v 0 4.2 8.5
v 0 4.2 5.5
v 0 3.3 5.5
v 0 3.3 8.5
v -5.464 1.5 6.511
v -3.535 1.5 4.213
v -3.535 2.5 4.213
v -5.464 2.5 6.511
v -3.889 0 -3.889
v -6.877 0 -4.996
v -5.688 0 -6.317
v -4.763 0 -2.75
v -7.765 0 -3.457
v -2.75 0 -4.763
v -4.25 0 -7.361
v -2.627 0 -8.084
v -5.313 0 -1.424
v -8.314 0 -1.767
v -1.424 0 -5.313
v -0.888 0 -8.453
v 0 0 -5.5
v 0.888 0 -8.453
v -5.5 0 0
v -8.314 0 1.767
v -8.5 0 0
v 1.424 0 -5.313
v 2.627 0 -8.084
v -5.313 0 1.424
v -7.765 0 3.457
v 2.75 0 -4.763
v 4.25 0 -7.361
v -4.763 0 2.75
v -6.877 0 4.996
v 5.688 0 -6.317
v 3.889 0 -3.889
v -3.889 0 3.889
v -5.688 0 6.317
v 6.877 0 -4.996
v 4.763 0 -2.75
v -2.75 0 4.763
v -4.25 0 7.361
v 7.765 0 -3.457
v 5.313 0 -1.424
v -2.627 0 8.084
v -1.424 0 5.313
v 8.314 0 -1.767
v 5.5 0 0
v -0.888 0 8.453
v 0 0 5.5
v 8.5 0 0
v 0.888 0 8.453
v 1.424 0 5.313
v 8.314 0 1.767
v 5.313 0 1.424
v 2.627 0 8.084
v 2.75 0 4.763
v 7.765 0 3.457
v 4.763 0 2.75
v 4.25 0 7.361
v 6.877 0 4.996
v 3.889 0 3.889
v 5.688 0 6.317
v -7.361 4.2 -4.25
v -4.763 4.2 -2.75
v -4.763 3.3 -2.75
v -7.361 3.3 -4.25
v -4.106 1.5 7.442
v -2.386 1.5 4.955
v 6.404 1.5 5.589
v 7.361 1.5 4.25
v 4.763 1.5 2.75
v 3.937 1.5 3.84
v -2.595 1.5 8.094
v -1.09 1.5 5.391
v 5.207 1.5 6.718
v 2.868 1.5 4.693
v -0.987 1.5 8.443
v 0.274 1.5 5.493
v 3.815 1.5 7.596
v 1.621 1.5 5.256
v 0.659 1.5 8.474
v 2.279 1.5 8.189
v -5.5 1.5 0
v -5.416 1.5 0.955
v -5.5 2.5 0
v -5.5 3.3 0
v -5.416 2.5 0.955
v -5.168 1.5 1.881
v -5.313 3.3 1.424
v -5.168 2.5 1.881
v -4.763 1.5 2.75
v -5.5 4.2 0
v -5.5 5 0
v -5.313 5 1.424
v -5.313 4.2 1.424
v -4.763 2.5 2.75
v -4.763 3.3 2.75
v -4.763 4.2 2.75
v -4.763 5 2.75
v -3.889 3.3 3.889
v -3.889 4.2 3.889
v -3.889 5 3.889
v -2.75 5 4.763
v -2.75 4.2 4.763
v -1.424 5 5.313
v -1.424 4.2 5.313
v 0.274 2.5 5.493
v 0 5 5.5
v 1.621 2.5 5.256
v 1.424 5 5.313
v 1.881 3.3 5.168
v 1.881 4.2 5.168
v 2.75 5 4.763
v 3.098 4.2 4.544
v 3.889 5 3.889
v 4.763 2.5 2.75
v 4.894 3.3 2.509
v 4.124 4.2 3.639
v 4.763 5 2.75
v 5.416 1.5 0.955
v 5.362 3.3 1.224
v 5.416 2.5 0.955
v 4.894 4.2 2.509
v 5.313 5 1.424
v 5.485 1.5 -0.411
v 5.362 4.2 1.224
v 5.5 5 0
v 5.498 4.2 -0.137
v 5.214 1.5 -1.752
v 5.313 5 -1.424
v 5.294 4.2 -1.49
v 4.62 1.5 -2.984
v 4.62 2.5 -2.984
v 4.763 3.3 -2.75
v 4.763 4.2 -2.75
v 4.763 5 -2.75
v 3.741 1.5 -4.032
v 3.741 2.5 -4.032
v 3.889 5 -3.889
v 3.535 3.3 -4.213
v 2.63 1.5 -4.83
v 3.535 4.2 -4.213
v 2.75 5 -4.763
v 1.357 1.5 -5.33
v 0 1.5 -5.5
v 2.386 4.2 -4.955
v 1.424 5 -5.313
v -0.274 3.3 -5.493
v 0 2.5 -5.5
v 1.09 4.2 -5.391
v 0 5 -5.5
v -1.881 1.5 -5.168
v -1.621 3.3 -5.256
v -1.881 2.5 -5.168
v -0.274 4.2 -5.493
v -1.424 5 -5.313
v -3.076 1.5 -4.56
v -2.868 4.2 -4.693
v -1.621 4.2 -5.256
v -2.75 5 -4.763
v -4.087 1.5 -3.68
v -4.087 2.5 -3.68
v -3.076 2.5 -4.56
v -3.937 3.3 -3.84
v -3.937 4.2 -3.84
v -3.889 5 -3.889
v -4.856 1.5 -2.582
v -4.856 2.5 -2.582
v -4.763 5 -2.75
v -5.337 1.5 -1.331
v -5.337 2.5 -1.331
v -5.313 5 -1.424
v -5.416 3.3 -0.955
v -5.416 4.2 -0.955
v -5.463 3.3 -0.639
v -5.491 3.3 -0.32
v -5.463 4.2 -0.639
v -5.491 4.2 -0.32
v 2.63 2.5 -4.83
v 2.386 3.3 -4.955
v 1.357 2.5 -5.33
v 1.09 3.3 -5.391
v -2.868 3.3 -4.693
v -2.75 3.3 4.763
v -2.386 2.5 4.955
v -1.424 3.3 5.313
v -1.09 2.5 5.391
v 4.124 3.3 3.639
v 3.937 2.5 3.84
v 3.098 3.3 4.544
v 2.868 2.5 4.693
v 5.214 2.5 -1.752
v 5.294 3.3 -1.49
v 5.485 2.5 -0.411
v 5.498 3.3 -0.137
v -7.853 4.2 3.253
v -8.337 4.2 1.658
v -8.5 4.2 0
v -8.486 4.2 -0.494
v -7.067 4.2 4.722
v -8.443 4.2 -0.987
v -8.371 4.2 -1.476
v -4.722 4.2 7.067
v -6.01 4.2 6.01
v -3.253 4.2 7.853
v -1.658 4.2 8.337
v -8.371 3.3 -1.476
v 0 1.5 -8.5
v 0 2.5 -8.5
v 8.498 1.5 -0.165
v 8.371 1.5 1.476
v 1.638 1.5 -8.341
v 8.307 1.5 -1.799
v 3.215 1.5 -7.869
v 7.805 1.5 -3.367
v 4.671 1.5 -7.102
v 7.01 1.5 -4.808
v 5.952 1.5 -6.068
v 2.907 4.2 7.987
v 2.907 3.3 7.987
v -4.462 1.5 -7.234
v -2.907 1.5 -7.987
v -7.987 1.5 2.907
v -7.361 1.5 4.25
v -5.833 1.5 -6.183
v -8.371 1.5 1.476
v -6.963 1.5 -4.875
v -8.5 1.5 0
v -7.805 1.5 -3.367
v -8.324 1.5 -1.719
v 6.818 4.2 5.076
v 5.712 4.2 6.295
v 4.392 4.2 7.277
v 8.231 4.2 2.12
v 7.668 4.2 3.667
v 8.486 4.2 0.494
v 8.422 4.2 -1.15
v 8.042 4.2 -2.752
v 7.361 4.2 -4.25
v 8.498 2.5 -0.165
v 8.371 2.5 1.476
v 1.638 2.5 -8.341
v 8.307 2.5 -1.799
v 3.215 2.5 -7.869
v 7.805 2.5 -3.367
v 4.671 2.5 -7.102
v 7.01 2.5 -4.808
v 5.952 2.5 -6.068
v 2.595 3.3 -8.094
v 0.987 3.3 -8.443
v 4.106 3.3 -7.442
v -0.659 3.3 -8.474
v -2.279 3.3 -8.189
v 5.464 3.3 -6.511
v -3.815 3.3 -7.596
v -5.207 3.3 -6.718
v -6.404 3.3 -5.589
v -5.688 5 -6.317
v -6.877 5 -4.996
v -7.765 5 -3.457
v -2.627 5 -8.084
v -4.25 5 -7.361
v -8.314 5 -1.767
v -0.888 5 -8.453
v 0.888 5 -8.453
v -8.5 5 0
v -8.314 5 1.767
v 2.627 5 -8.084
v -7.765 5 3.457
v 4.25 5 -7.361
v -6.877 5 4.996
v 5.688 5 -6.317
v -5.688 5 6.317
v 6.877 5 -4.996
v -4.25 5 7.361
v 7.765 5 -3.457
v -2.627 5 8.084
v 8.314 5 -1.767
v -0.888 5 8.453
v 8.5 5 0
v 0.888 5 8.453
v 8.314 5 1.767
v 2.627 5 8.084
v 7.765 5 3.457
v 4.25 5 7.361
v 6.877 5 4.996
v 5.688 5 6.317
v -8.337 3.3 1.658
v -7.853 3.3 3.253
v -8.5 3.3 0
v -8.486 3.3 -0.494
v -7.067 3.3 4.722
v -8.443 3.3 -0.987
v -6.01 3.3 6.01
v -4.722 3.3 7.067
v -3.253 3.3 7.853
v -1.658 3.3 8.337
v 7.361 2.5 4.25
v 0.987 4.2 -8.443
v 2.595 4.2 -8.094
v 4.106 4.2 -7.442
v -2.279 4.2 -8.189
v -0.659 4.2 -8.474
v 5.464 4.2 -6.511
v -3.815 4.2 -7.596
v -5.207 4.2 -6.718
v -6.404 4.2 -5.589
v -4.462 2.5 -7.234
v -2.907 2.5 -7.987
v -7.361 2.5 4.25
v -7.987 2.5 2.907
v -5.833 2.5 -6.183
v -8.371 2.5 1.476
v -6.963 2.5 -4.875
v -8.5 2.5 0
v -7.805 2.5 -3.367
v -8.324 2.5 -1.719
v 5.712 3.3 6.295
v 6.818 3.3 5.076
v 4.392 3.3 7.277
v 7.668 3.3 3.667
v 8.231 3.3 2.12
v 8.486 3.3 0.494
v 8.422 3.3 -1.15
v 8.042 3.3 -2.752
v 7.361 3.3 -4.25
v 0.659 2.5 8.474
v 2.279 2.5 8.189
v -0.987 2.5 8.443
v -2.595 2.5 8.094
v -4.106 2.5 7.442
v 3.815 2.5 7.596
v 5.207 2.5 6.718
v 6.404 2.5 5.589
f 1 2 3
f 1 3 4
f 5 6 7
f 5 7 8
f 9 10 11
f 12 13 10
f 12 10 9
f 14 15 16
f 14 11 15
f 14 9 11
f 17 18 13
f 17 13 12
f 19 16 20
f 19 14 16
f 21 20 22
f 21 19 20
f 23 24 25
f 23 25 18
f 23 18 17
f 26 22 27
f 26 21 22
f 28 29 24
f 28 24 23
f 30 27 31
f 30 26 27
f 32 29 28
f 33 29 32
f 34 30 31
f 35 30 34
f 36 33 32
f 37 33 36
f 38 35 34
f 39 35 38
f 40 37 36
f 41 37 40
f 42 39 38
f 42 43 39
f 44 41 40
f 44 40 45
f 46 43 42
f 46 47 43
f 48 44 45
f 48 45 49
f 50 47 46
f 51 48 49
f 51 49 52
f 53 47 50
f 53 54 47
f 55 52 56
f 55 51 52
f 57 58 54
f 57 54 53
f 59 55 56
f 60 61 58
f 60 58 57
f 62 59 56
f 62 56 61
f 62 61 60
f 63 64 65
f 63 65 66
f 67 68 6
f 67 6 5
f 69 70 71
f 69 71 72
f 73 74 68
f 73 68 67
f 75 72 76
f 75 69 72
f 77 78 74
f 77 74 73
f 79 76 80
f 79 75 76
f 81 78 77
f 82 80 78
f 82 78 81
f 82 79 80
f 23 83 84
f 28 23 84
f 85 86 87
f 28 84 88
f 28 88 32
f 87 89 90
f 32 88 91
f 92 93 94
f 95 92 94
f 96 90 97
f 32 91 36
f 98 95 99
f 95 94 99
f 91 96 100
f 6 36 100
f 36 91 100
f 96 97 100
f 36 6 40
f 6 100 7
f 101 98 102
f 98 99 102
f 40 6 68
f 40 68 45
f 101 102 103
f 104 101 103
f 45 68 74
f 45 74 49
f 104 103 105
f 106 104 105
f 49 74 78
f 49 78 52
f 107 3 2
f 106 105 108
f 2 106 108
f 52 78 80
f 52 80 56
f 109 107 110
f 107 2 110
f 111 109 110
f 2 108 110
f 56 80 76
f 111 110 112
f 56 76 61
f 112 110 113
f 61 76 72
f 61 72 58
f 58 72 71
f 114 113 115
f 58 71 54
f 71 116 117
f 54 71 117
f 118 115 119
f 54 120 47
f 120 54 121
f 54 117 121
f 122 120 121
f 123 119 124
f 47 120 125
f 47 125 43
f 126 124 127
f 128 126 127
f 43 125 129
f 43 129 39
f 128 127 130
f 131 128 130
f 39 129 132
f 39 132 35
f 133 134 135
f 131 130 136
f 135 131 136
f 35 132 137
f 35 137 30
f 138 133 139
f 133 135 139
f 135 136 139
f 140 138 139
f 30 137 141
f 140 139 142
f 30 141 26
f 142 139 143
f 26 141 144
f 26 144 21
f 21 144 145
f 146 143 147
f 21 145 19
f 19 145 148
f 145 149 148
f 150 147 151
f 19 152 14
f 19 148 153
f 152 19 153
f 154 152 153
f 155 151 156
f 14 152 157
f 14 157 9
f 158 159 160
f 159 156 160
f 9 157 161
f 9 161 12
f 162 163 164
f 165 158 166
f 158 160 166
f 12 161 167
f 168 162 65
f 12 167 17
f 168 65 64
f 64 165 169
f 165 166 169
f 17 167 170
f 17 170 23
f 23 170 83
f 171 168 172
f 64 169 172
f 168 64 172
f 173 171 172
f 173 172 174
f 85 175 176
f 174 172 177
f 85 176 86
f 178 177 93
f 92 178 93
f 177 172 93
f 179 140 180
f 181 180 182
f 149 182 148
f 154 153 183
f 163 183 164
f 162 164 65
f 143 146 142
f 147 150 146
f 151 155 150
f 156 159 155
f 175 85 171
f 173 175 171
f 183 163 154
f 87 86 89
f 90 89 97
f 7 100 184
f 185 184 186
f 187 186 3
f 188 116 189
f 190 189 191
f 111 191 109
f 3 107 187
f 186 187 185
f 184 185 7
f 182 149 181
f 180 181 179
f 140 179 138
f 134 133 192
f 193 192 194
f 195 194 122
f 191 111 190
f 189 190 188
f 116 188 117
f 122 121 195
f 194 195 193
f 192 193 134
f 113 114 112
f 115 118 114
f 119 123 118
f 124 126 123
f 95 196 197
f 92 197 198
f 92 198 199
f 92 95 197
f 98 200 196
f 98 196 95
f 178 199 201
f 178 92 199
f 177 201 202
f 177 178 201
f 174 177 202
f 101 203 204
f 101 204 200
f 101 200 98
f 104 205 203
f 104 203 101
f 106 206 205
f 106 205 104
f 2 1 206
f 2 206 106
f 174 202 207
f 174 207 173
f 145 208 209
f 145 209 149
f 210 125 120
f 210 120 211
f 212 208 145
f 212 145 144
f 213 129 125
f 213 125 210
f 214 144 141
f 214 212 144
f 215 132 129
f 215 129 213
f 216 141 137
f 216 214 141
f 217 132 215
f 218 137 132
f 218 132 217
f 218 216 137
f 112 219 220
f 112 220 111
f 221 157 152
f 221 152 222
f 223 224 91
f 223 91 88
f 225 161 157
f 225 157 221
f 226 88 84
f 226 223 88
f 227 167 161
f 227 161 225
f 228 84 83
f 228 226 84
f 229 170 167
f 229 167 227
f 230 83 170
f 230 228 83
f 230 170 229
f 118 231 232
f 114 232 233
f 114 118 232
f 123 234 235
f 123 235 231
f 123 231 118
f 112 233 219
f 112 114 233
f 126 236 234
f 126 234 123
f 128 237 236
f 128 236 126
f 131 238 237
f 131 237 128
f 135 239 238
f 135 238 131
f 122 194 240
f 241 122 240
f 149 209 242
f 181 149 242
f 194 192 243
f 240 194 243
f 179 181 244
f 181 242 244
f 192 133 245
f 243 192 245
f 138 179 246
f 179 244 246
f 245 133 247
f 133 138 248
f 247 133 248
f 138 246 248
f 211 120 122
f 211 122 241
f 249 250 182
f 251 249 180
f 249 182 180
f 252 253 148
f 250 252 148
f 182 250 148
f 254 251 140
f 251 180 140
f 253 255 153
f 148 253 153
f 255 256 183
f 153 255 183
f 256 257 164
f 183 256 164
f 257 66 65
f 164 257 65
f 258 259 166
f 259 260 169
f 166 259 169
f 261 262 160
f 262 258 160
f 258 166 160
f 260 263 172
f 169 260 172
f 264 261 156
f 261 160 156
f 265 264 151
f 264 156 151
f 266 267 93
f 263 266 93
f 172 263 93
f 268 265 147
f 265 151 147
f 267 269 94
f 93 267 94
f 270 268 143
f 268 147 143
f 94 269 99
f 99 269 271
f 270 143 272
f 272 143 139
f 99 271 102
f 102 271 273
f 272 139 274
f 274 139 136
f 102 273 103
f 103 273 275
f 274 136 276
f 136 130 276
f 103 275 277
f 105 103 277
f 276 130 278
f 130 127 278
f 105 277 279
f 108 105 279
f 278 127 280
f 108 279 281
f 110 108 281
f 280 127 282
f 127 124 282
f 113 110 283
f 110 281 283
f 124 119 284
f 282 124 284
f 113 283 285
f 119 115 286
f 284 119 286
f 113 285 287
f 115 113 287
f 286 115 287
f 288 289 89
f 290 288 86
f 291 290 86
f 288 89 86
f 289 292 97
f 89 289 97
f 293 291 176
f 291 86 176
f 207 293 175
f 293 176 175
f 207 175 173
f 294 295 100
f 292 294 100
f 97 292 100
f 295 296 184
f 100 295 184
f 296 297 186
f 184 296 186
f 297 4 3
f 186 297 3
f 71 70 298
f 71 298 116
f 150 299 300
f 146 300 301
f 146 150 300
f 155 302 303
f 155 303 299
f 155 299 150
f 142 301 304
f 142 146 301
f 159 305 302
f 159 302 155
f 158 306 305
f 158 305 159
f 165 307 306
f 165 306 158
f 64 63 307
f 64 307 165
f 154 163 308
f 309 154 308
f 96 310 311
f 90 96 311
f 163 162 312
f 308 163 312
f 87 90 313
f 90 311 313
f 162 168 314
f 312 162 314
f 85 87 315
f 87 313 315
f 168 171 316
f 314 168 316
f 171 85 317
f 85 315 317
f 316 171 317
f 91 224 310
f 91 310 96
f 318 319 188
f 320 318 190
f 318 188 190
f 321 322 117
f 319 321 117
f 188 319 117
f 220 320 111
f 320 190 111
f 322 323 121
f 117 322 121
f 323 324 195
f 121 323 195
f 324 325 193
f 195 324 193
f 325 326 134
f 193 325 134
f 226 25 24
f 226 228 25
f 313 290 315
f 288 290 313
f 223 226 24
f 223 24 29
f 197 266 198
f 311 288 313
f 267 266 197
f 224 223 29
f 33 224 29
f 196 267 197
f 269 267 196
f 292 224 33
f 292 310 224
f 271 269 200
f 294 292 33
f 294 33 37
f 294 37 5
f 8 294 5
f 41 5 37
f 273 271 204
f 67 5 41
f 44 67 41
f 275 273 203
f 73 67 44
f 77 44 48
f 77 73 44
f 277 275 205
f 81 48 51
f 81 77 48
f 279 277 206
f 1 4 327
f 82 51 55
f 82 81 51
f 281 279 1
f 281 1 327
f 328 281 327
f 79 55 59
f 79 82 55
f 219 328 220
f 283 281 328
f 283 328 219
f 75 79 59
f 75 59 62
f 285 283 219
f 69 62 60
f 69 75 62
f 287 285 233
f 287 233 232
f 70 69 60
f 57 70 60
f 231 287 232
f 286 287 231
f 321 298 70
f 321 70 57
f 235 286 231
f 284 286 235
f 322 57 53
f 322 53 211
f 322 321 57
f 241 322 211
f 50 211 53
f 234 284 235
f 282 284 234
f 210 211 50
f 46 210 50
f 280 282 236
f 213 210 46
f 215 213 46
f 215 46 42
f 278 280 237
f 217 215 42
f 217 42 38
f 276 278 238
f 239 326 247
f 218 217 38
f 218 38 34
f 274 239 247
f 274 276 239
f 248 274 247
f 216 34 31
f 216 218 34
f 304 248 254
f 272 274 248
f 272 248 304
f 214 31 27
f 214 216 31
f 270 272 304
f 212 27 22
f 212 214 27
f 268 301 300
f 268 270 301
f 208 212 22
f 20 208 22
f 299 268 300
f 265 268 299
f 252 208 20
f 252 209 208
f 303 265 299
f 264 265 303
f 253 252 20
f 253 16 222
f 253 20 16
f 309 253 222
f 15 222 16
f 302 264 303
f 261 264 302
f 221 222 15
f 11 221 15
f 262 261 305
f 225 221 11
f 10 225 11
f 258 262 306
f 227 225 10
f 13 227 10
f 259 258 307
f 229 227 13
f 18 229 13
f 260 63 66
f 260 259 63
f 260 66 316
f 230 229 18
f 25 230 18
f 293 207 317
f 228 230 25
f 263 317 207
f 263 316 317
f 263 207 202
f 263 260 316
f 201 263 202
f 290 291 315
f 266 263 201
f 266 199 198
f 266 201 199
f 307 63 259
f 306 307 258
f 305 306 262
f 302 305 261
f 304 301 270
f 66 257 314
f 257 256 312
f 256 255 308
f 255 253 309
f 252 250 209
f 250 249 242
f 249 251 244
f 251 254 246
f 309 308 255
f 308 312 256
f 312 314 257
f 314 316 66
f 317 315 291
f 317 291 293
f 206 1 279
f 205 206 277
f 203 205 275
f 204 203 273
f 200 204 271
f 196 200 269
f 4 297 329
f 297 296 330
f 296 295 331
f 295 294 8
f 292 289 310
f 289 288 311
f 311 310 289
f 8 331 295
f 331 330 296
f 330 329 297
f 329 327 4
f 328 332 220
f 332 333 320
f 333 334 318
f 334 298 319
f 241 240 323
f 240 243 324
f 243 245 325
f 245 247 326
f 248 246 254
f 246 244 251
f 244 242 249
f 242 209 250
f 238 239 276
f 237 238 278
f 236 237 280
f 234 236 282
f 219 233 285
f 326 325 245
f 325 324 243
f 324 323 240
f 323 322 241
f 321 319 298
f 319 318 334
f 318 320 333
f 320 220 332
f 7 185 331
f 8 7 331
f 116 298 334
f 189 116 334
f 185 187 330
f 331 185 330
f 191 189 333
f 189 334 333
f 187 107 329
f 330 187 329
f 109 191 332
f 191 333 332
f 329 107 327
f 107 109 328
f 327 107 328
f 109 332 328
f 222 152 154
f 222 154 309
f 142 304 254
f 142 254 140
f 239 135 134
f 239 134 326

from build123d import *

# Parameters (mm, degrees)
ESBO_O9_W             = 3
ESBO_O9_H             = 5
CORTE_EXTRUS_O1_DEPTH = 1
PADR_OCIRCULAR2_COUNT = 3
CORTE_EXTRUS_O3_START = 0.9
CORTE_EXTRUS_O3_DEPTH = 0.9
PADR_OCIRCULAR4_COUNT = 3


with BuildPart() as part:
    # Esboço9 → Revolução1 (revolve)
    with BuildSketch(Plane.XY, mode=Mode.PRIVATE) as revolu_o1_sk:
        with Locations((7, 2.5)):
            Rectangle(ESBO_O9_W, ESBO_O9_H)
    revolve(revolu_o1_sk.sketch.rotate(Axis((0, -112.760074913, 0), (0, 1, 0)), 180), axis=Axis((0, -112.760074913, 0), (0, 1, 0)))

    # Esboço12 → Corte-extrusão1 (cut)
    with BuildSketch(Plane(origin=(0, 1.5, 0), x_dir=(1, 0, 0), z_dir=(0, 1, 0))):
        with BuildLine():
            Line((0, 8.5), (0, 5.5))
            ThreePointArc((0, 5.5), (4.213244437, 3.535331853), (5.416442642, -0.955064977))
            Line((5.416442642, -0.955064977), (8.370865901, -1.47600951))
            ThreePointArc((8.370865901, -1.47600951), (6.511377767, 5.463694682), (0, 8.5))
        make_face()
    corte_extrus_o1 = extrude(amount=CORTE_EXTRUS_O1_DEPTH, mode=Mode.SUBTRACT)

    # PadrãoCircular2: Corte-extrusão1 ×3 about axis
    padr_ocircular2_axis = Axis((0, 0, 0), (0, 1, 0))
    for i in range(1, PADR_OCIRCULAR2_COUNT):
        add(corte_extrus_o1.rotate(padr_ocircular2_axis, i * 360 / PADR_OCIRCULAR2_COUNT), mode=Mode.SUBTRACT)

    # Esboço13 → Corte-extrusão3 (cut)
    with BuildSketch(Plane(origin=(0, 3.3, 0), x_dir=(1, 0, 0), z_dir=(0, 1, 0)).offset(CORTE_EXTRUS_O3_START)):
        with BuildLine():
            Line((0, 0), (7.361215932, 4.25))
            ThreePointArc((7.361215932, 4.25), (7.987387277, -2.907171218), (2.907171218, -7.987387277))
            Line((2.907171218, -7.987387277), (0, 0))
        make_face()
    corte_extrus_o3 = extrude(amount=-CORTE_EXTRUS_O3_DEPTH, mode=Mode.SUBTRACT)

    # PadrãoCircular4: Corte-extrusão3 ×3 about axis
    padr_ocircular4_axis = Axis((0, 0, 0), (0, 1, 0))
    for i in range(1, PADR_OCIRCULAR4_COUNT):
        add(corte_extrus_o3.rotate(padr_ocircular4_axis, i * 360 / PADR_OCIRCULAR4_COUNT), mode=Mode.SUBTRACT)


solid = part.part
